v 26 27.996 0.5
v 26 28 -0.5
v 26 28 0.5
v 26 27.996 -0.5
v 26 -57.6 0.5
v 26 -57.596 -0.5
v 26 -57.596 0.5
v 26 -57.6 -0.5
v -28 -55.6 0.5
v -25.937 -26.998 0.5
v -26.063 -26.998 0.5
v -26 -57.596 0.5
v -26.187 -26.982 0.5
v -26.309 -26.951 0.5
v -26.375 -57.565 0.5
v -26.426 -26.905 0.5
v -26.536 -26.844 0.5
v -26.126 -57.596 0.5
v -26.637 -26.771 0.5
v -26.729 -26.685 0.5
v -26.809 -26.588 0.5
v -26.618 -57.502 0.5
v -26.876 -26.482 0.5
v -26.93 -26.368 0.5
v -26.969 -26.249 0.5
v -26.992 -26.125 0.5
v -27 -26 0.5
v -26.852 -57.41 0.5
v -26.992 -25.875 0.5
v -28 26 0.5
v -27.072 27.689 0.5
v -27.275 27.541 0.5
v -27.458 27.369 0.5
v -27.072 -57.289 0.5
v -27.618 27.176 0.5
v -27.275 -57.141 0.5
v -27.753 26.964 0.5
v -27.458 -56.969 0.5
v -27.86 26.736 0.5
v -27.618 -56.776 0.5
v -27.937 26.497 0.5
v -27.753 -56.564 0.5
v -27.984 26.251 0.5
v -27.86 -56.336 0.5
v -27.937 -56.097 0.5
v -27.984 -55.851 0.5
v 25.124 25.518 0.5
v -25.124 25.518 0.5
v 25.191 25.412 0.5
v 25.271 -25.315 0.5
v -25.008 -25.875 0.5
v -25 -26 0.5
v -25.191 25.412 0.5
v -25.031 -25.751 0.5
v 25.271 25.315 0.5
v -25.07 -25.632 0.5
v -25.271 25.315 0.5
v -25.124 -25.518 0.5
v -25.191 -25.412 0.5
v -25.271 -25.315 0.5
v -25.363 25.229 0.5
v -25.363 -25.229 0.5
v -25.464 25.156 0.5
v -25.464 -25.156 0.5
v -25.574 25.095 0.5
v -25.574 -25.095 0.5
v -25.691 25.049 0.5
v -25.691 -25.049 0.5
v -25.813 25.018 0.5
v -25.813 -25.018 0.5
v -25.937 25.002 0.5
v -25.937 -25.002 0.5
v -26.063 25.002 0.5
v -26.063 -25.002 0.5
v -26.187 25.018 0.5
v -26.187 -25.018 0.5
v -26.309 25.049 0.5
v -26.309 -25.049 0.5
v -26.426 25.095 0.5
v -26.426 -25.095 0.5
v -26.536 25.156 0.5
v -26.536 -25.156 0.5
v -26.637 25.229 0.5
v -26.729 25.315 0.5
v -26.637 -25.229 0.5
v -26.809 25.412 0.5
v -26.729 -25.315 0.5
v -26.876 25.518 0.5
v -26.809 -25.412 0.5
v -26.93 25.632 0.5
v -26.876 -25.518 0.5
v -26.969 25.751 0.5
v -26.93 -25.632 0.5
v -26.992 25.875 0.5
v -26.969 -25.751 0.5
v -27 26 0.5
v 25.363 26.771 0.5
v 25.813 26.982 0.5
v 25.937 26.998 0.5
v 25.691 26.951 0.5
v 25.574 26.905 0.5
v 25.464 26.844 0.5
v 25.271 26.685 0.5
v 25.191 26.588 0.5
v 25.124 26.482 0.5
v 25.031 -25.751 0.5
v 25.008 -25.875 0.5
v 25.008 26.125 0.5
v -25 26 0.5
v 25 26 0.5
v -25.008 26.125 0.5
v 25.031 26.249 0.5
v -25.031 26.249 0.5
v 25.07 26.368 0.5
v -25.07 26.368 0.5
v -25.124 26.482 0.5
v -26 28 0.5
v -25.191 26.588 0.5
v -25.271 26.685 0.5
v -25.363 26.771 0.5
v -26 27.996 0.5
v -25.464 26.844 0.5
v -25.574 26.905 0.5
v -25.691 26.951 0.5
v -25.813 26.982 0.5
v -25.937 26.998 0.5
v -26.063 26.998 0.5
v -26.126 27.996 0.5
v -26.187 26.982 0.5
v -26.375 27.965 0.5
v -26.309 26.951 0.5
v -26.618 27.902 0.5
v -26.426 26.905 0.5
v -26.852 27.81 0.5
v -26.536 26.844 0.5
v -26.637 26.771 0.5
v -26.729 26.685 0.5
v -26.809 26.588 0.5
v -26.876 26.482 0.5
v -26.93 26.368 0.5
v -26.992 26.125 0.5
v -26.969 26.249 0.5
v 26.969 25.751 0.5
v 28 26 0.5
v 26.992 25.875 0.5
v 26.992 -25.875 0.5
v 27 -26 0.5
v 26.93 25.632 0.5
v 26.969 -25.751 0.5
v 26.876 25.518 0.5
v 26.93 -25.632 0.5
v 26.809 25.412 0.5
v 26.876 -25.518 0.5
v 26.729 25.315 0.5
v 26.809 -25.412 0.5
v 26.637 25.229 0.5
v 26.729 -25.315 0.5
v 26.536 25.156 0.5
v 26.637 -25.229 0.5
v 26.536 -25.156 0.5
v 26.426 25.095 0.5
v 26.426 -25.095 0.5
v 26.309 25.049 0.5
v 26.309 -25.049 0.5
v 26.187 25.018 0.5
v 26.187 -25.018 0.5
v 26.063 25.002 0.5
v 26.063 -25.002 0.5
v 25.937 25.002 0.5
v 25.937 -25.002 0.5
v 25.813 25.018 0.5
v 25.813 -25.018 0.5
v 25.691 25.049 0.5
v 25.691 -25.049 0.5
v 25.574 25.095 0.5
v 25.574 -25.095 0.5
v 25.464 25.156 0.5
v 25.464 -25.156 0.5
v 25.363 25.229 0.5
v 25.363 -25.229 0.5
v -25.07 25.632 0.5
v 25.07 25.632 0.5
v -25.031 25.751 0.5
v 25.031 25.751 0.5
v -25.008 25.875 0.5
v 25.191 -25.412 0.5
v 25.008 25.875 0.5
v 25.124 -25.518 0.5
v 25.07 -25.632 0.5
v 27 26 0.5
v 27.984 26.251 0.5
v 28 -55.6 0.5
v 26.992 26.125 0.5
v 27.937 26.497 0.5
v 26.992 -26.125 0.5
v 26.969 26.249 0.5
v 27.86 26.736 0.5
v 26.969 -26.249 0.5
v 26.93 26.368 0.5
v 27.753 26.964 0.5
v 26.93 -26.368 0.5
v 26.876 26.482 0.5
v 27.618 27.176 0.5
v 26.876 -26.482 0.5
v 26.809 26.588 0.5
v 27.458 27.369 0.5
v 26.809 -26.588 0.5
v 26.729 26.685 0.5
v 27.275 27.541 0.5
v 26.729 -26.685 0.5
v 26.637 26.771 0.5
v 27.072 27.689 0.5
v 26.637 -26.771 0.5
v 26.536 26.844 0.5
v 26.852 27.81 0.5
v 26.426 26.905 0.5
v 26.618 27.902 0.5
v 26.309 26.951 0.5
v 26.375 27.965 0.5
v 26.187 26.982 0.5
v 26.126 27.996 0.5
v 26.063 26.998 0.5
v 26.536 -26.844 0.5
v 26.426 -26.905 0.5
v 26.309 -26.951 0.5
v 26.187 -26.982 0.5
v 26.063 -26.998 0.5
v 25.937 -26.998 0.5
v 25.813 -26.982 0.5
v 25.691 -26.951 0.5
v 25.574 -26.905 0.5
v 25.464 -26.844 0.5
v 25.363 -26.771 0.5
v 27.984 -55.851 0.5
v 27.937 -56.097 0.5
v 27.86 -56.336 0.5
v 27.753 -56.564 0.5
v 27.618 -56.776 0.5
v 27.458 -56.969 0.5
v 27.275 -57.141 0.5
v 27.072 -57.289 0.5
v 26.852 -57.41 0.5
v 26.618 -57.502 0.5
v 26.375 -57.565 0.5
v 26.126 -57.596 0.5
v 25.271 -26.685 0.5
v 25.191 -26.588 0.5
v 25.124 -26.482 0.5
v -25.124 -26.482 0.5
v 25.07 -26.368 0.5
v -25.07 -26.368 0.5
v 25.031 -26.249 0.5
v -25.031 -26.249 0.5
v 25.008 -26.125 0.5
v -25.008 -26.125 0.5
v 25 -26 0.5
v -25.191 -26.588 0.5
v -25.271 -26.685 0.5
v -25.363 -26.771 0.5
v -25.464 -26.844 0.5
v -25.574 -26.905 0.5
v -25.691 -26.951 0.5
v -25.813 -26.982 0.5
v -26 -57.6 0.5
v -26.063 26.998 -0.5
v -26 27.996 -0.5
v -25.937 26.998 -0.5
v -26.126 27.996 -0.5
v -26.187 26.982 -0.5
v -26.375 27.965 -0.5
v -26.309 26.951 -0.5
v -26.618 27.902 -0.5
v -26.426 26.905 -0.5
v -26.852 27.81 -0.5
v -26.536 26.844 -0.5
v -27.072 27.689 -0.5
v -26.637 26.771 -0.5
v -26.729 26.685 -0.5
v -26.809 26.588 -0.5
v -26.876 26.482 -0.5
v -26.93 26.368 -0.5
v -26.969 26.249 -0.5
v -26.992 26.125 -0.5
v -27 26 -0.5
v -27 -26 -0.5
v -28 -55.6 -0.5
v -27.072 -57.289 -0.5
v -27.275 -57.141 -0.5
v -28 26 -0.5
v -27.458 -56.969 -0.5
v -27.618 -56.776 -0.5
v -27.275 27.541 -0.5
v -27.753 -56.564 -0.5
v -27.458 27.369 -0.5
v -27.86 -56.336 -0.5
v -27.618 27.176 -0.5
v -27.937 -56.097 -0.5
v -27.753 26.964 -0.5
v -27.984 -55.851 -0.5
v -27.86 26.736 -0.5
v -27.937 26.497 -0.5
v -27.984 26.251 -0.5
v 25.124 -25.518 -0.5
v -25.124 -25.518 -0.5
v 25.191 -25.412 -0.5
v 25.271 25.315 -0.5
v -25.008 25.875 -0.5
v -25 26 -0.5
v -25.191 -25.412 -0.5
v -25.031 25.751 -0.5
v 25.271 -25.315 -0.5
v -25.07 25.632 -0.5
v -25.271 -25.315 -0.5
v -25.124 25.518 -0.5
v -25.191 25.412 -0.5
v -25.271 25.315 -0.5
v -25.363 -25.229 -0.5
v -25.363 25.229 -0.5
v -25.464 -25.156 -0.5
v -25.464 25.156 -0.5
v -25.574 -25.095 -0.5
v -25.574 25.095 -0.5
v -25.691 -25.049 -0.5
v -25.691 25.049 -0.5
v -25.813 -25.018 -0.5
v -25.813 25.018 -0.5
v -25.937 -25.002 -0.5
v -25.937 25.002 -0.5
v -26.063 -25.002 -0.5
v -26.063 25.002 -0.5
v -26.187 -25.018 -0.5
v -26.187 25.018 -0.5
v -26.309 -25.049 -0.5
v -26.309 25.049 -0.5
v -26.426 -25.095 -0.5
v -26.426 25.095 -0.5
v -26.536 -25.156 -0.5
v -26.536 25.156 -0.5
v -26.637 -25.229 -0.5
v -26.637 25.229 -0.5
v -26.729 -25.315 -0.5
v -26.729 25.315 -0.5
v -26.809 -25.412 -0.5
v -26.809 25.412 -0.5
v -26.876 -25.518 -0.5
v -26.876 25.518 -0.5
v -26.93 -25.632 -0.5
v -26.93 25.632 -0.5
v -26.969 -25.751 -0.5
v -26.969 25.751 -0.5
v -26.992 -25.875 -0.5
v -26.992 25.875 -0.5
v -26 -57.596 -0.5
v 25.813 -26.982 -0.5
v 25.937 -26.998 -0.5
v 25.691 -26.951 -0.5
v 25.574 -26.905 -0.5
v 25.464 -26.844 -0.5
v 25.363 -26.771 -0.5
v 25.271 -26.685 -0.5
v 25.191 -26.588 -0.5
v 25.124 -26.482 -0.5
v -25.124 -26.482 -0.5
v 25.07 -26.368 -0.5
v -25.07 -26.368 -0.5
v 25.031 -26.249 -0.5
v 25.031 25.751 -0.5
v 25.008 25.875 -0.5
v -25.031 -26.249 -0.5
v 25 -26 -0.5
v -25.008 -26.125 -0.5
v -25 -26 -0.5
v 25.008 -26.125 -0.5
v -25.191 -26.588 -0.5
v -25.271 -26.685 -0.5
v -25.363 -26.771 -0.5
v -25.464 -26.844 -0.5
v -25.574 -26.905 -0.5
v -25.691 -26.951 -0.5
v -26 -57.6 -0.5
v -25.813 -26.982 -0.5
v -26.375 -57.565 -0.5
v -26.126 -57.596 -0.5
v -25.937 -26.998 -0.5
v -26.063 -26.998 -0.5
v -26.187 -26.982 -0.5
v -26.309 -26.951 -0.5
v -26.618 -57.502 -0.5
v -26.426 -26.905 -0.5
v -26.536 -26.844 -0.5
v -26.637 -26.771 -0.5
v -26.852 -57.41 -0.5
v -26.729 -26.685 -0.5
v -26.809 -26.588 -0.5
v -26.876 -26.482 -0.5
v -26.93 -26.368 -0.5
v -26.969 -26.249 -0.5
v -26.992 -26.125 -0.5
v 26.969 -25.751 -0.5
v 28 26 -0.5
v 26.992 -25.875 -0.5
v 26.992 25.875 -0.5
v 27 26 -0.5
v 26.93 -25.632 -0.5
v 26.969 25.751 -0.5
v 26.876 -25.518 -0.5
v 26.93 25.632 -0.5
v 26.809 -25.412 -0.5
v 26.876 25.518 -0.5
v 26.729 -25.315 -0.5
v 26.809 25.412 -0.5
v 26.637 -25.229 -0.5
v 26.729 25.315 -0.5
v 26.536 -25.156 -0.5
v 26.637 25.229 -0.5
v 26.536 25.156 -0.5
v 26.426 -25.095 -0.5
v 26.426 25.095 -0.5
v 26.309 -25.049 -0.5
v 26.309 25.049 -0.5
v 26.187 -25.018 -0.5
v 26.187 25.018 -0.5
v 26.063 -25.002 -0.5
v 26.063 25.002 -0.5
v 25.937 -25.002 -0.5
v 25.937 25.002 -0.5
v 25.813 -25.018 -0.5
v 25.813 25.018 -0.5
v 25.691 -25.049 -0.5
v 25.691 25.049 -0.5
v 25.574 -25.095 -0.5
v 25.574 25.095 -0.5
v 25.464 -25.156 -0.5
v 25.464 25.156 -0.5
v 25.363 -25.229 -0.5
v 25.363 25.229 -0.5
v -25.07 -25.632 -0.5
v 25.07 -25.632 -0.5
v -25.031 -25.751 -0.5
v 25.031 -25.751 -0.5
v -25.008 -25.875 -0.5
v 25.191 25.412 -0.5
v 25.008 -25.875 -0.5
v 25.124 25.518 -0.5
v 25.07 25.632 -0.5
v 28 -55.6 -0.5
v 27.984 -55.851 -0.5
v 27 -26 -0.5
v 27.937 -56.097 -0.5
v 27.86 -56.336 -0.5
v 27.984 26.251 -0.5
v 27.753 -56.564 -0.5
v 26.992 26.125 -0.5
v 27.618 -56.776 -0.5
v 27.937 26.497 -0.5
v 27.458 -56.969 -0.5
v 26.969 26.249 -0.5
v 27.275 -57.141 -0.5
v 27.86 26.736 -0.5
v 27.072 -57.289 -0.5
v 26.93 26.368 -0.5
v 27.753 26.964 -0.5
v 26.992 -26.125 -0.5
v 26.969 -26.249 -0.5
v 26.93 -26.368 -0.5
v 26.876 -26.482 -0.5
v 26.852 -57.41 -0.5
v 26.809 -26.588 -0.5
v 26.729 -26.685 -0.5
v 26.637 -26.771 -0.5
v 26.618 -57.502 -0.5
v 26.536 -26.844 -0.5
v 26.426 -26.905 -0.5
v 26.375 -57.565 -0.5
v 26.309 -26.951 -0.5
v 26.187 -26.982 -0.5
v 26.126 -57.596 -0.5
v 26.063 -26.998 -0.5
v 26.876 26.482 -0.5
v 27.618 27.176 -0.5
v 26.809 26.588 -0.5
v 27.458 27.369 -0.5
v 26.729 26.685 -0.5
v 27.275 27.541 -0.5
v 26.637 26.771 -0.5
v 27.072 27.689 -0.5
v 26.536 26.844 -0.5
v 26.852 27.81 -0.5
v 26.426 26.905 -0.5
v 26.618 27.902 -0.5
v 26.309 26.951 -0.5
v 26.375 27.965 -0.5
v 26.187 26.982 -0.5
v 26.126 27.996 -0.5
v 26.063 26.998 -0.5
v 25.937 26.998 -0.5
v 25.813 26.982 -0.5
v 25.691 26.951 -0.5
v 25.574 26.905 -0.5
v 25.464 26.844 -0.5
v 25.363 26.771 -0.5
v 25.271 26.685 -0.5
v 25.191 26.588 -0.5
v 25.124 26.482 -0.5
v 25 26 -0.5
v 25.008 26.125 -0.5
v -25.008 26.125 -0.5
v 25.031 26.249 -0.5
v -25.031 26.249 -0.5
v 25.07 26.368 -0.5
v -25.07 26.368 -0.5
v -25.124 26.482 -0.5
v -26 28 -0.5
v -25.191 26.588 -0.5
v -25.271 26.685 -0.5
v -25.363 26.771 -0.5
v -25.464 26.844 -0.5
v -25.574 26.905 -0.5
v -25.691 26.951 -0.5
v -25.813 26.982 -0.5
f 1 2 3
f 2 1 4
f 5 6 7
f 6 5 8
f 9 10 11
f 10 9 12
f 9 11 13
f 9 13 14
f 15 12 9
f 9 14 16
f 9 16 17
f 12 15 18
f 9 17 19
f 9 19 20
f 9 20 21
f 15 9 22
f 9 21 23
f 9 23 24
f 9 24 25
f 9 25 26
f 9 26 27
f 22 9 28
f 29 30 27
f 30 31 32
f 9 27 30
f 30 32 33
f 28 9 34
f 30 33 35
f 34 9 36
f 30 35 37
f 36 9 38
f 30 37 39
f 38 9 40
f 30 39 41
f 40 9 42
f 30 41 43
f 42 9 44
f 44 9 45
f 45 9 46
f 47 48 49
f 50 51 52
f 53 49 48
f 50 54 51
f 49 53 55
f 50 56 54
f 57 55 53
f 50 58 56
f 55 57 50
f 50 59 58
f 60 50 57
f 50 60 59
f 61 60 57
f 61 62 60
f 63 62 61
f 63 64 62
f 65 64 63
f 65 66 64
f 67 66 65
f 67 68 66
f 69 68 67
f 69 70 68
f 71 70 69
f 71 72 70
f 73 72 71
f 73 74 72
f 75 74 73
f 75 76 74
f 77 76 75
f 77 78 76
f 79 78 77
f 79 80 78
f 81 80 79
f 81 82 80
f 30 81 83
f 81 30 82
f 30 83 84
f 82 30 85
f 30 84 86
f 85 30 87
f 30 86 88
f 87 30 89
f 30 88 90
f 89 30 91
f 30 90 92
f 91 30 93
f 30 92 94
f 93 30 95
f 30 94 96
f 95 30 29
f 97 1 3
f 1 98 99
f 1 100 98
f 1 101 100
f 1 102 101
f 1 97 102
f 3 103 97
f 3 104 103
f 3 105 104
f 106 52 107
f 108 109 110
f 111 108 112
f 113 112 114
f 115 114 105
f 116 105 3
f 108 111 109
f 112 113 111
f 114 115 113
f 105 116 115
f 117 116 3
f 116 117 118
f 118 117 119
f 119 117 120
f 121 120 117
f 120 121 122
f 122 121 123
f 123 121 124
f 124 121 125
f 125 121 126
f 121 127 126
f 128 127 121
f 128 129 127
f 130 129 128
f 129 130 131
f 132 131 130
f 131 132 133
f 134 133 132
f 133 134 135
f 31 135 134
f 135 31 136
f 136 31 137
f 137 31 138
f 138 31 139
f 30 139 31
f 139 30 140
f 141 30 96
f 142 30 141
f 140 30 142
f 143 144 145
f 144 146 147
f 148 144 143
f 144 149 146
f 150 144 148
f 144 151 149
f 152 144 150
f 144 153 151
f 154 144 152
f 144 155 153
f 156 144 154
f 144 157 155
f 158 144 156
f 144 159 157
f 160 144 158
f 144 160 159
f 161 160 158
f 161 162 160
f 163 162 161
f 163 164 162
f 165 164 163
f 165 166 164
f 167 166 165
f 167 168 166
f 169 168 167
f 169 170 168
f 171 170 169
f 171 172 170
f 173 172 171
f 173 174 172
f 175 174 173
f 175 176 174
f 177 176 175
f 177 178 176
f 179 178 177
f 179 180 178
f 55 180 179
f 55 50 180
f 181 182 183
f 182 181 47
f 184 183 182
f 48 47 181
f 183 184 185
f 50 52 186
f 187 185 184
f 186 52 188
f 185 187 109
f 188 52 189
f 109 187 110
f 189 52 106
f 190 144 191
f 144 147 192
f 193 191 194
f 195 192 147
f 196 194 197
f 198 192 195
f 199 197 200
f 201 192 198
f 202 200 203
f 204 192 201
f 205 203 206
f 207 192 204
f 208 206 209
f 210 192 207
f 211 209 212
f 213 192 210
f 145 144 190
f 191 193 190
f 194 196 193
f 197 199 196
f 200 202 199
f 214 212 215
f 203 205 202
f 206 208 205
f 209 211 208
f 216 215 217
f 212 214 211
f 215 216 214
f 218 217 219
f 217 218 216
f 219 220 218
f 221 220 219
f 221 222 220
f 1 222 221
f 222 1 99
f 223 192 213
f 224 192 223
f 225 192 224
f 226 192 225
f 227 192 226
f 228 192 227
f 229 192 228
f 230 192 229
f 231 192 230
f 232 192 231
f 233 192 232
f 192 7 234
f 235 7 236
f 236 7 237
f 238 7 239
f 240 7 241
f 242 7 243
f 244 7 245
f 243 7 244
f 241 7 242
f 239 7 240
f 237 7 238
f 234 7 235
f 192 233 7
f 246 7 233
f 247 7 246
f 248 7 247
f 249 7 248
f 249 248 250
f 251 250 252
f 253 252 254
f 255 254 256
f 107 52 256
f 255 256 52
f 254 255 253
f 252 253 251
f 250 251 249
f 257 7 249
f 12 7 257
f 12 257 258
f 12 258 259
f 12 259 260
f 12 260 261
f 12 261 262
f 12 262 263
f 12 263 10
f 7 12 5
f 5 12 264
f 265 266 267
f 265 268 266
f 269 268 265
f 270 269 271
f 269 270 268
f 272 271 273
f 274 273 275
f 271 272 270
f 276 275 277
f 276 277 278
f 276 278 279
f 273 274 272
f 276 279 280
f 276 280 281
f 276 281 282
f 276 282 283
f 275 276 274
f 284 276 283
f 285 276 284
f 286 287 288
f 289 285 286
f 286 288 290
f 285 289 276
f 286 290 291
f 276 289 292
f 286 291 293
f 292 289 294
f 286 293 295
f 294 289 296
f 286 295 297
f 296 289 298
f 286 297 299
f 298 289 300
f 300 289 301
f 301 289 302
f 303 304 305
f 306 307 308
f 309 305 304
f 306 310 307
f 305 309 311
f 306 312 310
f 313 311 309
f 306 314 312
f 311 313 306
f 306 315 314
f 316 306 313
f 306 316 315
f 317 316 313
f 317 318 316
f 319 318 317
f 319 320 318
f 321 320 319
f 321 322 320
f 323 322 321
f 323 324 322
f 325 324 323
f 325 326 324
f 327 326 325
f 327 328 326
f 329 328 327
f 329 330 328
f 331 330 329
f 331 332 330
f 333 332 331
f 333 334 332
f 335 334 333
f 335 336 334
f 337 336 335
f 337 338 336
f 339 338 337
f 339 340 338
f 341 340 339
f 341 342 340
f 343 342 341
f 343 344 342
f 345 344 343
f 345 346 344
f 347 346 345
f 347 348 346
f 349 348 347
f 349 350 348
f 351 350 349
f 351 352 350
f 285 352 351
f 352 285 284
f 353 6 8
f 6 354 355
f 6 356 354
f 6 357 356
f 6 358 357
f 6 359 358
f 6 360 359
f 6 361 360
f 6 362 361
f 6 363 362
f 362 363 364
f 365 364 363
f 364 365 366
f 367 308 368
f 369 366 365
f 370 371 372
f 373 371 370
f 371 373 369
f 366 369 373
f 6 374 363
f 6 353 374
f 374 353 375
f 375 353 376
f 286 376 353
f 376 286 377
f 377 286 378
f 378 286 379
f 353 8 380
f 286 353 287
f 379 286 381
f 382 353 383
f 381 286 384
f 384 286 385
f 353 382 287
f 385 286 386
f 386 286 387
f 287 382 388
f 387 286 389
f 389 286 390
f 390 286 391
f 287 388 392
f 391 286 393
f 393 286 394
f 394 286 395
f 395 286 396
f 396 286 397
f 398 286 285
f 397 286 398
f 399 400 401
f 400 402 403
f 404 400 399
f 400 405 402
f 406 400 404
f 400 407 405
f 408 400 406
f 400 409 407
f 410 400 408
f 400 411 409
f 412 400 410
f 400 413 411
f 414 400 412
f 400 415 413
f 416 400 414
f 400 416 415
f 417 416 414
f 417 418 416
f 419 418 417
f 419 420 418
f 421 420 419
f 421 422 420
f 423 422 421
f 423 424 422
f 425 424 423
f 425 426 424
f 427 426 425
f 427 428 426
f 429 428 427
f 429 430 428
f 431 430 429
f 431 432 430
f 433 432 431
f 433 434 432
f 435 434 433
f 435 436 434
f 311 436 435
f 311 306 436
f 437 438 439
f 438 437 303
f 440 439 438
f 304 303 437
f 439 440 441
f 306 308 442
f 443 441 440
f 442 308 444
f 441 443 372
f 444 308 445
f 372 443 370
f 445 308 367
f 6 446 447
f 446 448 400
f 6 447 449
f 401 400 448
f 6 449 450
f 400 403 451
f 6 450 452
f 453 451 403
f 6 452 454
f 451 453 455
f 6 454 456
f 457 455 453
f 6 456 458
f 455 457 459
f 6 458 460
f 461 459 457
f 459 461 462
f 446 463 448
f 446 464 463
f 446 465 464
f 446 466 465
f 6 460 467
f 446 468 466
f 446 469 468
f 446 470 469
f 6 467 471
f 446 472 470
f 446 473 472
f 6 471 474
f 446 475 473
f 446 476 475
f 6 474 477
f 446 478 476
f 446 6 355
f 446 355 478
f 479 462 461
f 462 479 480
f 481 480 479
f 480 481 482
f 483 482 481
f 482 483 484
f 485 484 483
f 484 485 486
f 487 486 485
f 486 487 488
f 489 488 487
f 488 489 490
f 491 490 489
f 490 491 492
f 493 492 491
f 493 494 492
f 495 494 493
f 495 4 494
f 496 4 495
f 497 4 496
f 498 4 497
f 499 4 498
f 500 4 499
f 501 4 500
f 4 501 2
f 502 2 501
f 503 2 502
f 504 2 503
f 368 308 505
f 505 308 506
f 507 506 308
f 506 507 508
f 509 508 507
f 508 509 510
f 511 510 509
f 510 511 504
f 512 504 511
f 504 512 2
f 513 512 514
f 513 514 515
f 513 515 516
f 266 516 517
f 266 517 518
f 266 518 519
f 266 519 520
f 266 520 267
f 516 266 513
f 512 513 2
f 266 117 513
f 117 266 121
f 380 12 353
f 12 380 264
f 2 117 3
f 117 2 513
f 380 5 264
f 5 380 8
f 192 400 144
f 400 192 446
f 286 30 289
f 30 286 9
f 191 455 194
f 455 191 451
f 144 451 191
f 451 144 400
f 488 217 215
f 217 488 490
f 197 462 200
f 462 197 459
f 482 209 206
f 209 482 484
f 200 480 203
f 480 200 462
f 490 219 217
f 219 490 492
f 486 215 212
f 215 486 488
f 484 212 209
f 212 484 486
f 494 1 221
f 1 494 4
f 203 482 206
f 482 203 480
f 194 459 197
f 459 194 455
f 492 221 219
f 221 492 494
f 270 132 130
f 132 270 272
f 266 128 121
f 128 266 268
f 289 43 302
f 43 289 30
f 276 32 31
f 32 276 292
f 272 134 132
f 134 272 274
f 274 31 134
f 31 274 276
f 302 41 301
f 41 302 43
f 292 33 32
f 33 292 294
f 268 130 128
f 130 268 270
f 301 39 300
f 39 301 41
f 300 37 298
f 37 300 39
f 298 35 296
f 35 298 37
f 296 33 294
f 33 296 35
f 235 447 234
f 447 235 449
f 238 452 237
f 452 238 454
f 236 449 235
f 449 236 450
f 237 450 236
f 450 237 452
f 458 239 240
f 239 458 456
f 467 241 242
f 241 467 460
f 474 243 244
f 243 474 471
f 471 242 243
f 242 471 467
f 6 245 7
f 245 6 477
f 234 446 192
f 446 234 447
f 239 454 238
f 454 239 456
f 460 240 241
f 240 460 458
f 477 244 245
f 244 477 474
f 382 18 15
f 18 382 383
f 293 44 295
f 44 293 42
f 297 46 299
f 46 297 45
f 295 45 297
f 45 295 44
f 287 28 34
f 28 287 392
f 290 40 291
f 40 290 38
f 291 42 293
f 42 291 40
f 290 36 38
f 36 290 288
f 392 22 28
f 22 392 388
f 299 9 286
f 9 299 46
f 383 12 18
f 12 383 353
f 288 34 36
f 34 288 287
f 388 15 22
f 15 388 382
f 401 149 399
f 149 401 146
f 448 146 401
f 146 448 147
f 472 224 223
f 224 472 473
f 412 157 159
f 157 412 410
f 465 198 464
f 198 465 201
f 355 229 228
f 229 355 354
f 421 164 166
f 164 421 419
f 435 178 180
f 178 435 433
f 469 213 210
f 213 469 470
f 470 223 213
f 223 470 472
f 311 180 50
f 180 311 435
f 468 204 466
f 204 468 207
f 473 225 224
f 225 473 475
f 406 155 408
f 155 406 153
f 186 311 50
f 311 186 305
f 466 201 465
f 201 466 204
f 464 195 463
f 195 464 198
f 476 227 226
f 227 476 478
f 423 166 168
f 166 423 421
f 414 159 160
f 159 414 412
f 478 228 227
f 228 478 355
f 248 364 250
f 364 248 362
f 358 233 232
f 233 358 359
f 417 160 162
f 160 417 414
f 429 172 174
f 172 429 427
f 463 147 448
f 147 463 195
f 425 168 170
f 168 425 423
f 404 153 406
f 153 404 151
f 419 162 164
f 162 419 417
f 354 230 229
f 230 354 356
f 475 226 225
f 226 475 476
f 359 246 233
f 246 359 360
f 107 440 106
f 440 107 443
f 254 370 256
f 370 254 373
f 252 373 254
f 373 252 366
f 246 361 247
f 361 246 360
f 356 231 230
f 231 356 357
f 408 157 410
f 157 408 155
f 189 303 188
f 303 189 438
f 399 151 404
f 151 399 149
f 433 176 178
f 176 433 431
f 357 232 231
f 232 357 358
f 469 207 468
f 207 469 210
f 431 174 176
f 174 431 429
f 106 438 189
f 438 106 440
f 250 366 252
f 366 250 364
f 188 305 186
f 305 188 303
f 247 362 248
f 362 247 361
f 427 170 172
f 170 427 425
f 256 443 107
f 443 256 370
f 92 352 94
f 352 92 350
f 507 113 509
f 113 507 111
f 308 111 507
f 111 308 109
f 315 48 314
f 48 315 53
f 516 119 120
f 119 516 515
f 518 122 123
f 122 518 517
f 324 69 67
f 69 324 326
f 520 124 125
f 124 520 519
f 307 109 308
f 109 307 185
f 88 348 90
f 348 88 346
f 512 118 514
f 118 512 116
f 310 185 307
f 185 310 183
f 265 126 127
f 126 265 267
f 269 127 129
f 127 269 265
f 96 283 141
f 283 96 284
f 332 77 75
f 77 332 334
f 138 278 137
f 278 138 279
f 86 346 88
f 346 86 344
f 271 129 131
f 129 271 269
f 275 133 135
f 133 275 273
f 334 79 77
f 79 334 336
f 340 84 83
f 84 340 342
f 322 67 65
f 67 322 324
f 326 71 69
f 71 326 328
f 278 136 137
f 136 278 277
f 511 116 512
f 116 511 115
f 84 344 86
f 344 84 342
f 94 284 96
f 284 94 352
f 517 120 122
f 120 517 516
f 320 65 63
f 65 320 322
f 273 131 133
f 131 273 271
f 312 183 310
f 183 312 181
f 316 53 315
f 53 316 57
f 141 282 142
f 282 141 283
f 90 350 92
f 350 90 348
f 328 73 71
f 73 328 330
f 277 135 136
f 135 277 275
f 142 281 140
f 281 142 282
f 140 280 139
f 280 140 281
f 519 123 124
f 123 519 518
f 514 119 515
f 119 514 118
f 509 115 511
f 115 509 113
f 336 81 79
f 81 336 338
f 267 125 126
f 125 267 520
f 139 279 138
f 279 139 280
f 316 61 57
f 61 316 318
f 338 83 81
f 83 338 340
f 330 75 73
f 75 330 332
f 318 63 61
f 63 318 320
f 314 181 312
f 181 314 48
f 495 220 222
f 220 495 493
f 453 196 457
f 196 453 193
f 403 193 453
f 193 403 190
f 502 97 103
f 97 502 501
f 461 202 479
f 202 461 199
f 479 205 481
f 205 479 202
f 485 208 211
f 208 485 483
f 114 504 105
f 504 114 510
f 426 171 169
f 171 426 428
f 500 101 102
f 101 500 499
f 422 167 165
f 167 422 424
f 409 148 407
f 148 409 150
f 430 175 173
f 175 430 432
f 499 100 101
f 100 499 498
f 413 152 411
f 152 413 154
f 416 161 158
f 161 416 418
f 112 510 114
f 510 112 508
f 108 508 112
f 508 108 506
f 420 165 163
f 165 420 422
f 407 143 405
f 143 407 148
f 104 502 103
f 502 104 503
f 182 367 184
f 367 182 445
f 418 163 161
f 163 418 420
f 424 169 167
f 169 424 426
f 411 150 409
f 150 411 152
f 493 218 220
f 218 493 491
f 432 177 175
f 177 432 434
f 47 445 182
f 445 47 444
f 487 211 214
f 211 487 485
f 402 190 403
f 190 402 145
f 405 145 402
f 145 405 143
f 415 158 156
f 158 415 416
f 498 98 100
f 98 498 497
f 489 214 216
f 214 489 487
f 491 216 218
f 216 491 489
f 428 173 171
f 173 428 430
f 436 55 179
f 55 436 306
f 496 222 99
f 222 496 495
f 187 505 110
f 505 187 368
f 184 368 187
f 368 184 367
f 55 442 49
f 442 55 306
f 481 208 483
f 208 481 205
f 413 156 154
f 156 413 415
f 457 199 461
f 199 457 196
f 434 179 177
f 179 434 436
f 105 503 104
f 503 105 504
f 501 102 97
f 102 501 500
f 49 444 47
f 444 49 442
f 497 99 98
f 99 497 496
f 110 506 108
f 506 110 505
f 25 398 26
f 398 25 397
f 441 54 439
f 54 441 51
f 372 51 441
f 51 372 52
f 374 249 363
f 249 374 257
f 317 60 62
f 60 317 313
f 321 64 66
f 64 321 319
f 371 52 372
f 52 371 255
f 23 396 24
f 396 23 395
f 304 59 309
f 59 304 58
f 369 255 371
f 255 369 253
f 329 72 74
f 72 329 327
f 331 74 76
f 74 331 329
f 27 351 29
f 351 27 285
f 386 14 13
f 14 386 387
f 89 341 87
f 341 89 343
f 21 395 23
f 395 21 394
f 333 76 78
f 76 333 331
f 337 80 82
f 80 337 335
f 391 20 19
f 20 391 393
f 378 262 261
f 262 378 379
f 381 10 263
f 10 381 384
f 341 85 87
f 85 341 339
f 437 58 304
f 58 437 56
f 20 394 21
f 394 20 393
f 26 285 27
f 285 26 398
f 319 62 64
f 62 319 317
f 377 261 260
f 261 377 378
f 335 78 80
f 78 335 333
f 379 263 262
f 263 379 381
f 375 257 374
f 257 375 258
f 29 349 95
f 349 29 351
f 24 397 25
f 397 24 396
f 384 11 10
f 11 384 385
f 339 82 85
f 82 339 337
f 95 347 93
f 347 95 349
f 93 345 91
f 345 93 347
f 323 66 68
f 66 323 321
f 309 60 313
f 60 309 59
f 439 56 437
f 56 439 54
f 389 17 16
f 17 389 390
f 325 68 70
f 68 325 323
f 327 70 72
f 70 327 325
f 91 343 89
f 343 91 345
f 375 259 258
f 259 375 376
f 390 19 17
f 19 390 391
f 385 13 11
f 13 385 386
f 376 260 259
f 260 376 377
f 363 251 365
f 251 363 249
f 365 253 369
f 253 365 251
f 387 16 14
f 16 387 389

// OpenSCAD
$fn = 50;

// Bohrungen
module bohrungen(x,y,r) {
	translate([x,-y,-50])
		cylinder(h=100,r=r);
	translate([-x,y,-1])
		cylinder(h=100,r=r);
	translate([x,y,-50])
		cylinder(h=100,r=r);
	translate([-x,-y,-50])
		cylinder(h=100,r=r);
}

module abgerundetePlatte(h,w,d,r) {
	cube(size=[h-2*r,w,d], center=true);
	cube(size=[h,w-2*r,d], center=true);

	x = (h-2*r)/2;
	y = (w-2*r)/2;
	translate([x,y,0])
		cylinder(h=d, r=r, center=true);
	translate([-x,y,0])
		cylinder(h=d, r=r, center=true);
	translate([x,-y,0])
		cylinder(h=d, r=r, center=true);
	translate([-x,-y,0])
		cylinder(h=d, r=r, center=true);
}

module print() {
	abgerundetePlatte(56.0, 85.6, 1, 2);
}

// Platine
module Pi2B() {
	color("green") {
		difference() {
			translate([0,(56-85.6)/2])
				print();
			bohrungen(56/2-2,56/2-2,1);
		}
	}
}



Pi2B();
